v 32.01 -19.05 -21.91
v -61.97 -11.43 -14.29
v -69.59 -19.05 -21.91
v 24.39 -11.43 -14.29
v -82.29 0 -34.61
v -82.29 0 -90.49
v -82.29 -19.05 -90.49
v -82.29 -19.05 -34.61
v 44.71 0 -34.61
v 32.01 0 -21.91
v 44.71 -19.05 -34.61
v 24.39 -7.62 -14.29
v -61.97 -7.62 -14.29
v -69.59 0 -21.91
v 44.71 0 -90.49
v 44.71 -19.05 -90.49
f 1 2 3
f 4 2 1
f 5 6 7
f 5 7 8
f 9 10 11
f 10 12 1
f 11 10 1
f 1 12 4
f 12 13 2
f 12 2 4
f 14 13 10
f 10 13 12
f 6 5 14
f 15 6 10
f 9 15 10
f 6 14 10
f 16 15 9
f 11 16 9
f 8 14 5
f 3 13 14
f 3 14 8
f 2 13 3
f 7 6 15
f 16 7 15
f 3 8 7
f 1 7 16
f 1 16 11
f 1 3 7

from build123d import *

# Parameters (mm, degrees)
F0_W     = 127
F0_H     = 76.2
F1_DEPTH = 19.05
F2_SIZE  = 20.32
F3_SIZE  = 7.62


with BuildPart() as f1:
    # F0 (on Front) → F1 (new body)
    with BuildSketch(Plane.XZ):
        with Locations((-18.789873, -52.389765)):
            Rectangle(F0_W, F0_H)
    extrude(amount=F1_DEPTH)

    # F2
    f2_edges = [f1.edges().sort_by_distance(p)[0] for p in [
        (44.710127, -9.525, -14.289765),
        (-82.289873, -9.525, -14.289765),
    ]]
    chamfer(f2_edges, length=F2_SIZE)

    # F3
    f3_edges = [f1.edges().sort_by_distance(p)[0] for p in [
        (-18.789873, -19.05, -14.289765),
        (-18.789873, 0, -14.289765),
    ]]
    chamfer(f3_edges, length=F3_SIZE)


solid = f1.part
